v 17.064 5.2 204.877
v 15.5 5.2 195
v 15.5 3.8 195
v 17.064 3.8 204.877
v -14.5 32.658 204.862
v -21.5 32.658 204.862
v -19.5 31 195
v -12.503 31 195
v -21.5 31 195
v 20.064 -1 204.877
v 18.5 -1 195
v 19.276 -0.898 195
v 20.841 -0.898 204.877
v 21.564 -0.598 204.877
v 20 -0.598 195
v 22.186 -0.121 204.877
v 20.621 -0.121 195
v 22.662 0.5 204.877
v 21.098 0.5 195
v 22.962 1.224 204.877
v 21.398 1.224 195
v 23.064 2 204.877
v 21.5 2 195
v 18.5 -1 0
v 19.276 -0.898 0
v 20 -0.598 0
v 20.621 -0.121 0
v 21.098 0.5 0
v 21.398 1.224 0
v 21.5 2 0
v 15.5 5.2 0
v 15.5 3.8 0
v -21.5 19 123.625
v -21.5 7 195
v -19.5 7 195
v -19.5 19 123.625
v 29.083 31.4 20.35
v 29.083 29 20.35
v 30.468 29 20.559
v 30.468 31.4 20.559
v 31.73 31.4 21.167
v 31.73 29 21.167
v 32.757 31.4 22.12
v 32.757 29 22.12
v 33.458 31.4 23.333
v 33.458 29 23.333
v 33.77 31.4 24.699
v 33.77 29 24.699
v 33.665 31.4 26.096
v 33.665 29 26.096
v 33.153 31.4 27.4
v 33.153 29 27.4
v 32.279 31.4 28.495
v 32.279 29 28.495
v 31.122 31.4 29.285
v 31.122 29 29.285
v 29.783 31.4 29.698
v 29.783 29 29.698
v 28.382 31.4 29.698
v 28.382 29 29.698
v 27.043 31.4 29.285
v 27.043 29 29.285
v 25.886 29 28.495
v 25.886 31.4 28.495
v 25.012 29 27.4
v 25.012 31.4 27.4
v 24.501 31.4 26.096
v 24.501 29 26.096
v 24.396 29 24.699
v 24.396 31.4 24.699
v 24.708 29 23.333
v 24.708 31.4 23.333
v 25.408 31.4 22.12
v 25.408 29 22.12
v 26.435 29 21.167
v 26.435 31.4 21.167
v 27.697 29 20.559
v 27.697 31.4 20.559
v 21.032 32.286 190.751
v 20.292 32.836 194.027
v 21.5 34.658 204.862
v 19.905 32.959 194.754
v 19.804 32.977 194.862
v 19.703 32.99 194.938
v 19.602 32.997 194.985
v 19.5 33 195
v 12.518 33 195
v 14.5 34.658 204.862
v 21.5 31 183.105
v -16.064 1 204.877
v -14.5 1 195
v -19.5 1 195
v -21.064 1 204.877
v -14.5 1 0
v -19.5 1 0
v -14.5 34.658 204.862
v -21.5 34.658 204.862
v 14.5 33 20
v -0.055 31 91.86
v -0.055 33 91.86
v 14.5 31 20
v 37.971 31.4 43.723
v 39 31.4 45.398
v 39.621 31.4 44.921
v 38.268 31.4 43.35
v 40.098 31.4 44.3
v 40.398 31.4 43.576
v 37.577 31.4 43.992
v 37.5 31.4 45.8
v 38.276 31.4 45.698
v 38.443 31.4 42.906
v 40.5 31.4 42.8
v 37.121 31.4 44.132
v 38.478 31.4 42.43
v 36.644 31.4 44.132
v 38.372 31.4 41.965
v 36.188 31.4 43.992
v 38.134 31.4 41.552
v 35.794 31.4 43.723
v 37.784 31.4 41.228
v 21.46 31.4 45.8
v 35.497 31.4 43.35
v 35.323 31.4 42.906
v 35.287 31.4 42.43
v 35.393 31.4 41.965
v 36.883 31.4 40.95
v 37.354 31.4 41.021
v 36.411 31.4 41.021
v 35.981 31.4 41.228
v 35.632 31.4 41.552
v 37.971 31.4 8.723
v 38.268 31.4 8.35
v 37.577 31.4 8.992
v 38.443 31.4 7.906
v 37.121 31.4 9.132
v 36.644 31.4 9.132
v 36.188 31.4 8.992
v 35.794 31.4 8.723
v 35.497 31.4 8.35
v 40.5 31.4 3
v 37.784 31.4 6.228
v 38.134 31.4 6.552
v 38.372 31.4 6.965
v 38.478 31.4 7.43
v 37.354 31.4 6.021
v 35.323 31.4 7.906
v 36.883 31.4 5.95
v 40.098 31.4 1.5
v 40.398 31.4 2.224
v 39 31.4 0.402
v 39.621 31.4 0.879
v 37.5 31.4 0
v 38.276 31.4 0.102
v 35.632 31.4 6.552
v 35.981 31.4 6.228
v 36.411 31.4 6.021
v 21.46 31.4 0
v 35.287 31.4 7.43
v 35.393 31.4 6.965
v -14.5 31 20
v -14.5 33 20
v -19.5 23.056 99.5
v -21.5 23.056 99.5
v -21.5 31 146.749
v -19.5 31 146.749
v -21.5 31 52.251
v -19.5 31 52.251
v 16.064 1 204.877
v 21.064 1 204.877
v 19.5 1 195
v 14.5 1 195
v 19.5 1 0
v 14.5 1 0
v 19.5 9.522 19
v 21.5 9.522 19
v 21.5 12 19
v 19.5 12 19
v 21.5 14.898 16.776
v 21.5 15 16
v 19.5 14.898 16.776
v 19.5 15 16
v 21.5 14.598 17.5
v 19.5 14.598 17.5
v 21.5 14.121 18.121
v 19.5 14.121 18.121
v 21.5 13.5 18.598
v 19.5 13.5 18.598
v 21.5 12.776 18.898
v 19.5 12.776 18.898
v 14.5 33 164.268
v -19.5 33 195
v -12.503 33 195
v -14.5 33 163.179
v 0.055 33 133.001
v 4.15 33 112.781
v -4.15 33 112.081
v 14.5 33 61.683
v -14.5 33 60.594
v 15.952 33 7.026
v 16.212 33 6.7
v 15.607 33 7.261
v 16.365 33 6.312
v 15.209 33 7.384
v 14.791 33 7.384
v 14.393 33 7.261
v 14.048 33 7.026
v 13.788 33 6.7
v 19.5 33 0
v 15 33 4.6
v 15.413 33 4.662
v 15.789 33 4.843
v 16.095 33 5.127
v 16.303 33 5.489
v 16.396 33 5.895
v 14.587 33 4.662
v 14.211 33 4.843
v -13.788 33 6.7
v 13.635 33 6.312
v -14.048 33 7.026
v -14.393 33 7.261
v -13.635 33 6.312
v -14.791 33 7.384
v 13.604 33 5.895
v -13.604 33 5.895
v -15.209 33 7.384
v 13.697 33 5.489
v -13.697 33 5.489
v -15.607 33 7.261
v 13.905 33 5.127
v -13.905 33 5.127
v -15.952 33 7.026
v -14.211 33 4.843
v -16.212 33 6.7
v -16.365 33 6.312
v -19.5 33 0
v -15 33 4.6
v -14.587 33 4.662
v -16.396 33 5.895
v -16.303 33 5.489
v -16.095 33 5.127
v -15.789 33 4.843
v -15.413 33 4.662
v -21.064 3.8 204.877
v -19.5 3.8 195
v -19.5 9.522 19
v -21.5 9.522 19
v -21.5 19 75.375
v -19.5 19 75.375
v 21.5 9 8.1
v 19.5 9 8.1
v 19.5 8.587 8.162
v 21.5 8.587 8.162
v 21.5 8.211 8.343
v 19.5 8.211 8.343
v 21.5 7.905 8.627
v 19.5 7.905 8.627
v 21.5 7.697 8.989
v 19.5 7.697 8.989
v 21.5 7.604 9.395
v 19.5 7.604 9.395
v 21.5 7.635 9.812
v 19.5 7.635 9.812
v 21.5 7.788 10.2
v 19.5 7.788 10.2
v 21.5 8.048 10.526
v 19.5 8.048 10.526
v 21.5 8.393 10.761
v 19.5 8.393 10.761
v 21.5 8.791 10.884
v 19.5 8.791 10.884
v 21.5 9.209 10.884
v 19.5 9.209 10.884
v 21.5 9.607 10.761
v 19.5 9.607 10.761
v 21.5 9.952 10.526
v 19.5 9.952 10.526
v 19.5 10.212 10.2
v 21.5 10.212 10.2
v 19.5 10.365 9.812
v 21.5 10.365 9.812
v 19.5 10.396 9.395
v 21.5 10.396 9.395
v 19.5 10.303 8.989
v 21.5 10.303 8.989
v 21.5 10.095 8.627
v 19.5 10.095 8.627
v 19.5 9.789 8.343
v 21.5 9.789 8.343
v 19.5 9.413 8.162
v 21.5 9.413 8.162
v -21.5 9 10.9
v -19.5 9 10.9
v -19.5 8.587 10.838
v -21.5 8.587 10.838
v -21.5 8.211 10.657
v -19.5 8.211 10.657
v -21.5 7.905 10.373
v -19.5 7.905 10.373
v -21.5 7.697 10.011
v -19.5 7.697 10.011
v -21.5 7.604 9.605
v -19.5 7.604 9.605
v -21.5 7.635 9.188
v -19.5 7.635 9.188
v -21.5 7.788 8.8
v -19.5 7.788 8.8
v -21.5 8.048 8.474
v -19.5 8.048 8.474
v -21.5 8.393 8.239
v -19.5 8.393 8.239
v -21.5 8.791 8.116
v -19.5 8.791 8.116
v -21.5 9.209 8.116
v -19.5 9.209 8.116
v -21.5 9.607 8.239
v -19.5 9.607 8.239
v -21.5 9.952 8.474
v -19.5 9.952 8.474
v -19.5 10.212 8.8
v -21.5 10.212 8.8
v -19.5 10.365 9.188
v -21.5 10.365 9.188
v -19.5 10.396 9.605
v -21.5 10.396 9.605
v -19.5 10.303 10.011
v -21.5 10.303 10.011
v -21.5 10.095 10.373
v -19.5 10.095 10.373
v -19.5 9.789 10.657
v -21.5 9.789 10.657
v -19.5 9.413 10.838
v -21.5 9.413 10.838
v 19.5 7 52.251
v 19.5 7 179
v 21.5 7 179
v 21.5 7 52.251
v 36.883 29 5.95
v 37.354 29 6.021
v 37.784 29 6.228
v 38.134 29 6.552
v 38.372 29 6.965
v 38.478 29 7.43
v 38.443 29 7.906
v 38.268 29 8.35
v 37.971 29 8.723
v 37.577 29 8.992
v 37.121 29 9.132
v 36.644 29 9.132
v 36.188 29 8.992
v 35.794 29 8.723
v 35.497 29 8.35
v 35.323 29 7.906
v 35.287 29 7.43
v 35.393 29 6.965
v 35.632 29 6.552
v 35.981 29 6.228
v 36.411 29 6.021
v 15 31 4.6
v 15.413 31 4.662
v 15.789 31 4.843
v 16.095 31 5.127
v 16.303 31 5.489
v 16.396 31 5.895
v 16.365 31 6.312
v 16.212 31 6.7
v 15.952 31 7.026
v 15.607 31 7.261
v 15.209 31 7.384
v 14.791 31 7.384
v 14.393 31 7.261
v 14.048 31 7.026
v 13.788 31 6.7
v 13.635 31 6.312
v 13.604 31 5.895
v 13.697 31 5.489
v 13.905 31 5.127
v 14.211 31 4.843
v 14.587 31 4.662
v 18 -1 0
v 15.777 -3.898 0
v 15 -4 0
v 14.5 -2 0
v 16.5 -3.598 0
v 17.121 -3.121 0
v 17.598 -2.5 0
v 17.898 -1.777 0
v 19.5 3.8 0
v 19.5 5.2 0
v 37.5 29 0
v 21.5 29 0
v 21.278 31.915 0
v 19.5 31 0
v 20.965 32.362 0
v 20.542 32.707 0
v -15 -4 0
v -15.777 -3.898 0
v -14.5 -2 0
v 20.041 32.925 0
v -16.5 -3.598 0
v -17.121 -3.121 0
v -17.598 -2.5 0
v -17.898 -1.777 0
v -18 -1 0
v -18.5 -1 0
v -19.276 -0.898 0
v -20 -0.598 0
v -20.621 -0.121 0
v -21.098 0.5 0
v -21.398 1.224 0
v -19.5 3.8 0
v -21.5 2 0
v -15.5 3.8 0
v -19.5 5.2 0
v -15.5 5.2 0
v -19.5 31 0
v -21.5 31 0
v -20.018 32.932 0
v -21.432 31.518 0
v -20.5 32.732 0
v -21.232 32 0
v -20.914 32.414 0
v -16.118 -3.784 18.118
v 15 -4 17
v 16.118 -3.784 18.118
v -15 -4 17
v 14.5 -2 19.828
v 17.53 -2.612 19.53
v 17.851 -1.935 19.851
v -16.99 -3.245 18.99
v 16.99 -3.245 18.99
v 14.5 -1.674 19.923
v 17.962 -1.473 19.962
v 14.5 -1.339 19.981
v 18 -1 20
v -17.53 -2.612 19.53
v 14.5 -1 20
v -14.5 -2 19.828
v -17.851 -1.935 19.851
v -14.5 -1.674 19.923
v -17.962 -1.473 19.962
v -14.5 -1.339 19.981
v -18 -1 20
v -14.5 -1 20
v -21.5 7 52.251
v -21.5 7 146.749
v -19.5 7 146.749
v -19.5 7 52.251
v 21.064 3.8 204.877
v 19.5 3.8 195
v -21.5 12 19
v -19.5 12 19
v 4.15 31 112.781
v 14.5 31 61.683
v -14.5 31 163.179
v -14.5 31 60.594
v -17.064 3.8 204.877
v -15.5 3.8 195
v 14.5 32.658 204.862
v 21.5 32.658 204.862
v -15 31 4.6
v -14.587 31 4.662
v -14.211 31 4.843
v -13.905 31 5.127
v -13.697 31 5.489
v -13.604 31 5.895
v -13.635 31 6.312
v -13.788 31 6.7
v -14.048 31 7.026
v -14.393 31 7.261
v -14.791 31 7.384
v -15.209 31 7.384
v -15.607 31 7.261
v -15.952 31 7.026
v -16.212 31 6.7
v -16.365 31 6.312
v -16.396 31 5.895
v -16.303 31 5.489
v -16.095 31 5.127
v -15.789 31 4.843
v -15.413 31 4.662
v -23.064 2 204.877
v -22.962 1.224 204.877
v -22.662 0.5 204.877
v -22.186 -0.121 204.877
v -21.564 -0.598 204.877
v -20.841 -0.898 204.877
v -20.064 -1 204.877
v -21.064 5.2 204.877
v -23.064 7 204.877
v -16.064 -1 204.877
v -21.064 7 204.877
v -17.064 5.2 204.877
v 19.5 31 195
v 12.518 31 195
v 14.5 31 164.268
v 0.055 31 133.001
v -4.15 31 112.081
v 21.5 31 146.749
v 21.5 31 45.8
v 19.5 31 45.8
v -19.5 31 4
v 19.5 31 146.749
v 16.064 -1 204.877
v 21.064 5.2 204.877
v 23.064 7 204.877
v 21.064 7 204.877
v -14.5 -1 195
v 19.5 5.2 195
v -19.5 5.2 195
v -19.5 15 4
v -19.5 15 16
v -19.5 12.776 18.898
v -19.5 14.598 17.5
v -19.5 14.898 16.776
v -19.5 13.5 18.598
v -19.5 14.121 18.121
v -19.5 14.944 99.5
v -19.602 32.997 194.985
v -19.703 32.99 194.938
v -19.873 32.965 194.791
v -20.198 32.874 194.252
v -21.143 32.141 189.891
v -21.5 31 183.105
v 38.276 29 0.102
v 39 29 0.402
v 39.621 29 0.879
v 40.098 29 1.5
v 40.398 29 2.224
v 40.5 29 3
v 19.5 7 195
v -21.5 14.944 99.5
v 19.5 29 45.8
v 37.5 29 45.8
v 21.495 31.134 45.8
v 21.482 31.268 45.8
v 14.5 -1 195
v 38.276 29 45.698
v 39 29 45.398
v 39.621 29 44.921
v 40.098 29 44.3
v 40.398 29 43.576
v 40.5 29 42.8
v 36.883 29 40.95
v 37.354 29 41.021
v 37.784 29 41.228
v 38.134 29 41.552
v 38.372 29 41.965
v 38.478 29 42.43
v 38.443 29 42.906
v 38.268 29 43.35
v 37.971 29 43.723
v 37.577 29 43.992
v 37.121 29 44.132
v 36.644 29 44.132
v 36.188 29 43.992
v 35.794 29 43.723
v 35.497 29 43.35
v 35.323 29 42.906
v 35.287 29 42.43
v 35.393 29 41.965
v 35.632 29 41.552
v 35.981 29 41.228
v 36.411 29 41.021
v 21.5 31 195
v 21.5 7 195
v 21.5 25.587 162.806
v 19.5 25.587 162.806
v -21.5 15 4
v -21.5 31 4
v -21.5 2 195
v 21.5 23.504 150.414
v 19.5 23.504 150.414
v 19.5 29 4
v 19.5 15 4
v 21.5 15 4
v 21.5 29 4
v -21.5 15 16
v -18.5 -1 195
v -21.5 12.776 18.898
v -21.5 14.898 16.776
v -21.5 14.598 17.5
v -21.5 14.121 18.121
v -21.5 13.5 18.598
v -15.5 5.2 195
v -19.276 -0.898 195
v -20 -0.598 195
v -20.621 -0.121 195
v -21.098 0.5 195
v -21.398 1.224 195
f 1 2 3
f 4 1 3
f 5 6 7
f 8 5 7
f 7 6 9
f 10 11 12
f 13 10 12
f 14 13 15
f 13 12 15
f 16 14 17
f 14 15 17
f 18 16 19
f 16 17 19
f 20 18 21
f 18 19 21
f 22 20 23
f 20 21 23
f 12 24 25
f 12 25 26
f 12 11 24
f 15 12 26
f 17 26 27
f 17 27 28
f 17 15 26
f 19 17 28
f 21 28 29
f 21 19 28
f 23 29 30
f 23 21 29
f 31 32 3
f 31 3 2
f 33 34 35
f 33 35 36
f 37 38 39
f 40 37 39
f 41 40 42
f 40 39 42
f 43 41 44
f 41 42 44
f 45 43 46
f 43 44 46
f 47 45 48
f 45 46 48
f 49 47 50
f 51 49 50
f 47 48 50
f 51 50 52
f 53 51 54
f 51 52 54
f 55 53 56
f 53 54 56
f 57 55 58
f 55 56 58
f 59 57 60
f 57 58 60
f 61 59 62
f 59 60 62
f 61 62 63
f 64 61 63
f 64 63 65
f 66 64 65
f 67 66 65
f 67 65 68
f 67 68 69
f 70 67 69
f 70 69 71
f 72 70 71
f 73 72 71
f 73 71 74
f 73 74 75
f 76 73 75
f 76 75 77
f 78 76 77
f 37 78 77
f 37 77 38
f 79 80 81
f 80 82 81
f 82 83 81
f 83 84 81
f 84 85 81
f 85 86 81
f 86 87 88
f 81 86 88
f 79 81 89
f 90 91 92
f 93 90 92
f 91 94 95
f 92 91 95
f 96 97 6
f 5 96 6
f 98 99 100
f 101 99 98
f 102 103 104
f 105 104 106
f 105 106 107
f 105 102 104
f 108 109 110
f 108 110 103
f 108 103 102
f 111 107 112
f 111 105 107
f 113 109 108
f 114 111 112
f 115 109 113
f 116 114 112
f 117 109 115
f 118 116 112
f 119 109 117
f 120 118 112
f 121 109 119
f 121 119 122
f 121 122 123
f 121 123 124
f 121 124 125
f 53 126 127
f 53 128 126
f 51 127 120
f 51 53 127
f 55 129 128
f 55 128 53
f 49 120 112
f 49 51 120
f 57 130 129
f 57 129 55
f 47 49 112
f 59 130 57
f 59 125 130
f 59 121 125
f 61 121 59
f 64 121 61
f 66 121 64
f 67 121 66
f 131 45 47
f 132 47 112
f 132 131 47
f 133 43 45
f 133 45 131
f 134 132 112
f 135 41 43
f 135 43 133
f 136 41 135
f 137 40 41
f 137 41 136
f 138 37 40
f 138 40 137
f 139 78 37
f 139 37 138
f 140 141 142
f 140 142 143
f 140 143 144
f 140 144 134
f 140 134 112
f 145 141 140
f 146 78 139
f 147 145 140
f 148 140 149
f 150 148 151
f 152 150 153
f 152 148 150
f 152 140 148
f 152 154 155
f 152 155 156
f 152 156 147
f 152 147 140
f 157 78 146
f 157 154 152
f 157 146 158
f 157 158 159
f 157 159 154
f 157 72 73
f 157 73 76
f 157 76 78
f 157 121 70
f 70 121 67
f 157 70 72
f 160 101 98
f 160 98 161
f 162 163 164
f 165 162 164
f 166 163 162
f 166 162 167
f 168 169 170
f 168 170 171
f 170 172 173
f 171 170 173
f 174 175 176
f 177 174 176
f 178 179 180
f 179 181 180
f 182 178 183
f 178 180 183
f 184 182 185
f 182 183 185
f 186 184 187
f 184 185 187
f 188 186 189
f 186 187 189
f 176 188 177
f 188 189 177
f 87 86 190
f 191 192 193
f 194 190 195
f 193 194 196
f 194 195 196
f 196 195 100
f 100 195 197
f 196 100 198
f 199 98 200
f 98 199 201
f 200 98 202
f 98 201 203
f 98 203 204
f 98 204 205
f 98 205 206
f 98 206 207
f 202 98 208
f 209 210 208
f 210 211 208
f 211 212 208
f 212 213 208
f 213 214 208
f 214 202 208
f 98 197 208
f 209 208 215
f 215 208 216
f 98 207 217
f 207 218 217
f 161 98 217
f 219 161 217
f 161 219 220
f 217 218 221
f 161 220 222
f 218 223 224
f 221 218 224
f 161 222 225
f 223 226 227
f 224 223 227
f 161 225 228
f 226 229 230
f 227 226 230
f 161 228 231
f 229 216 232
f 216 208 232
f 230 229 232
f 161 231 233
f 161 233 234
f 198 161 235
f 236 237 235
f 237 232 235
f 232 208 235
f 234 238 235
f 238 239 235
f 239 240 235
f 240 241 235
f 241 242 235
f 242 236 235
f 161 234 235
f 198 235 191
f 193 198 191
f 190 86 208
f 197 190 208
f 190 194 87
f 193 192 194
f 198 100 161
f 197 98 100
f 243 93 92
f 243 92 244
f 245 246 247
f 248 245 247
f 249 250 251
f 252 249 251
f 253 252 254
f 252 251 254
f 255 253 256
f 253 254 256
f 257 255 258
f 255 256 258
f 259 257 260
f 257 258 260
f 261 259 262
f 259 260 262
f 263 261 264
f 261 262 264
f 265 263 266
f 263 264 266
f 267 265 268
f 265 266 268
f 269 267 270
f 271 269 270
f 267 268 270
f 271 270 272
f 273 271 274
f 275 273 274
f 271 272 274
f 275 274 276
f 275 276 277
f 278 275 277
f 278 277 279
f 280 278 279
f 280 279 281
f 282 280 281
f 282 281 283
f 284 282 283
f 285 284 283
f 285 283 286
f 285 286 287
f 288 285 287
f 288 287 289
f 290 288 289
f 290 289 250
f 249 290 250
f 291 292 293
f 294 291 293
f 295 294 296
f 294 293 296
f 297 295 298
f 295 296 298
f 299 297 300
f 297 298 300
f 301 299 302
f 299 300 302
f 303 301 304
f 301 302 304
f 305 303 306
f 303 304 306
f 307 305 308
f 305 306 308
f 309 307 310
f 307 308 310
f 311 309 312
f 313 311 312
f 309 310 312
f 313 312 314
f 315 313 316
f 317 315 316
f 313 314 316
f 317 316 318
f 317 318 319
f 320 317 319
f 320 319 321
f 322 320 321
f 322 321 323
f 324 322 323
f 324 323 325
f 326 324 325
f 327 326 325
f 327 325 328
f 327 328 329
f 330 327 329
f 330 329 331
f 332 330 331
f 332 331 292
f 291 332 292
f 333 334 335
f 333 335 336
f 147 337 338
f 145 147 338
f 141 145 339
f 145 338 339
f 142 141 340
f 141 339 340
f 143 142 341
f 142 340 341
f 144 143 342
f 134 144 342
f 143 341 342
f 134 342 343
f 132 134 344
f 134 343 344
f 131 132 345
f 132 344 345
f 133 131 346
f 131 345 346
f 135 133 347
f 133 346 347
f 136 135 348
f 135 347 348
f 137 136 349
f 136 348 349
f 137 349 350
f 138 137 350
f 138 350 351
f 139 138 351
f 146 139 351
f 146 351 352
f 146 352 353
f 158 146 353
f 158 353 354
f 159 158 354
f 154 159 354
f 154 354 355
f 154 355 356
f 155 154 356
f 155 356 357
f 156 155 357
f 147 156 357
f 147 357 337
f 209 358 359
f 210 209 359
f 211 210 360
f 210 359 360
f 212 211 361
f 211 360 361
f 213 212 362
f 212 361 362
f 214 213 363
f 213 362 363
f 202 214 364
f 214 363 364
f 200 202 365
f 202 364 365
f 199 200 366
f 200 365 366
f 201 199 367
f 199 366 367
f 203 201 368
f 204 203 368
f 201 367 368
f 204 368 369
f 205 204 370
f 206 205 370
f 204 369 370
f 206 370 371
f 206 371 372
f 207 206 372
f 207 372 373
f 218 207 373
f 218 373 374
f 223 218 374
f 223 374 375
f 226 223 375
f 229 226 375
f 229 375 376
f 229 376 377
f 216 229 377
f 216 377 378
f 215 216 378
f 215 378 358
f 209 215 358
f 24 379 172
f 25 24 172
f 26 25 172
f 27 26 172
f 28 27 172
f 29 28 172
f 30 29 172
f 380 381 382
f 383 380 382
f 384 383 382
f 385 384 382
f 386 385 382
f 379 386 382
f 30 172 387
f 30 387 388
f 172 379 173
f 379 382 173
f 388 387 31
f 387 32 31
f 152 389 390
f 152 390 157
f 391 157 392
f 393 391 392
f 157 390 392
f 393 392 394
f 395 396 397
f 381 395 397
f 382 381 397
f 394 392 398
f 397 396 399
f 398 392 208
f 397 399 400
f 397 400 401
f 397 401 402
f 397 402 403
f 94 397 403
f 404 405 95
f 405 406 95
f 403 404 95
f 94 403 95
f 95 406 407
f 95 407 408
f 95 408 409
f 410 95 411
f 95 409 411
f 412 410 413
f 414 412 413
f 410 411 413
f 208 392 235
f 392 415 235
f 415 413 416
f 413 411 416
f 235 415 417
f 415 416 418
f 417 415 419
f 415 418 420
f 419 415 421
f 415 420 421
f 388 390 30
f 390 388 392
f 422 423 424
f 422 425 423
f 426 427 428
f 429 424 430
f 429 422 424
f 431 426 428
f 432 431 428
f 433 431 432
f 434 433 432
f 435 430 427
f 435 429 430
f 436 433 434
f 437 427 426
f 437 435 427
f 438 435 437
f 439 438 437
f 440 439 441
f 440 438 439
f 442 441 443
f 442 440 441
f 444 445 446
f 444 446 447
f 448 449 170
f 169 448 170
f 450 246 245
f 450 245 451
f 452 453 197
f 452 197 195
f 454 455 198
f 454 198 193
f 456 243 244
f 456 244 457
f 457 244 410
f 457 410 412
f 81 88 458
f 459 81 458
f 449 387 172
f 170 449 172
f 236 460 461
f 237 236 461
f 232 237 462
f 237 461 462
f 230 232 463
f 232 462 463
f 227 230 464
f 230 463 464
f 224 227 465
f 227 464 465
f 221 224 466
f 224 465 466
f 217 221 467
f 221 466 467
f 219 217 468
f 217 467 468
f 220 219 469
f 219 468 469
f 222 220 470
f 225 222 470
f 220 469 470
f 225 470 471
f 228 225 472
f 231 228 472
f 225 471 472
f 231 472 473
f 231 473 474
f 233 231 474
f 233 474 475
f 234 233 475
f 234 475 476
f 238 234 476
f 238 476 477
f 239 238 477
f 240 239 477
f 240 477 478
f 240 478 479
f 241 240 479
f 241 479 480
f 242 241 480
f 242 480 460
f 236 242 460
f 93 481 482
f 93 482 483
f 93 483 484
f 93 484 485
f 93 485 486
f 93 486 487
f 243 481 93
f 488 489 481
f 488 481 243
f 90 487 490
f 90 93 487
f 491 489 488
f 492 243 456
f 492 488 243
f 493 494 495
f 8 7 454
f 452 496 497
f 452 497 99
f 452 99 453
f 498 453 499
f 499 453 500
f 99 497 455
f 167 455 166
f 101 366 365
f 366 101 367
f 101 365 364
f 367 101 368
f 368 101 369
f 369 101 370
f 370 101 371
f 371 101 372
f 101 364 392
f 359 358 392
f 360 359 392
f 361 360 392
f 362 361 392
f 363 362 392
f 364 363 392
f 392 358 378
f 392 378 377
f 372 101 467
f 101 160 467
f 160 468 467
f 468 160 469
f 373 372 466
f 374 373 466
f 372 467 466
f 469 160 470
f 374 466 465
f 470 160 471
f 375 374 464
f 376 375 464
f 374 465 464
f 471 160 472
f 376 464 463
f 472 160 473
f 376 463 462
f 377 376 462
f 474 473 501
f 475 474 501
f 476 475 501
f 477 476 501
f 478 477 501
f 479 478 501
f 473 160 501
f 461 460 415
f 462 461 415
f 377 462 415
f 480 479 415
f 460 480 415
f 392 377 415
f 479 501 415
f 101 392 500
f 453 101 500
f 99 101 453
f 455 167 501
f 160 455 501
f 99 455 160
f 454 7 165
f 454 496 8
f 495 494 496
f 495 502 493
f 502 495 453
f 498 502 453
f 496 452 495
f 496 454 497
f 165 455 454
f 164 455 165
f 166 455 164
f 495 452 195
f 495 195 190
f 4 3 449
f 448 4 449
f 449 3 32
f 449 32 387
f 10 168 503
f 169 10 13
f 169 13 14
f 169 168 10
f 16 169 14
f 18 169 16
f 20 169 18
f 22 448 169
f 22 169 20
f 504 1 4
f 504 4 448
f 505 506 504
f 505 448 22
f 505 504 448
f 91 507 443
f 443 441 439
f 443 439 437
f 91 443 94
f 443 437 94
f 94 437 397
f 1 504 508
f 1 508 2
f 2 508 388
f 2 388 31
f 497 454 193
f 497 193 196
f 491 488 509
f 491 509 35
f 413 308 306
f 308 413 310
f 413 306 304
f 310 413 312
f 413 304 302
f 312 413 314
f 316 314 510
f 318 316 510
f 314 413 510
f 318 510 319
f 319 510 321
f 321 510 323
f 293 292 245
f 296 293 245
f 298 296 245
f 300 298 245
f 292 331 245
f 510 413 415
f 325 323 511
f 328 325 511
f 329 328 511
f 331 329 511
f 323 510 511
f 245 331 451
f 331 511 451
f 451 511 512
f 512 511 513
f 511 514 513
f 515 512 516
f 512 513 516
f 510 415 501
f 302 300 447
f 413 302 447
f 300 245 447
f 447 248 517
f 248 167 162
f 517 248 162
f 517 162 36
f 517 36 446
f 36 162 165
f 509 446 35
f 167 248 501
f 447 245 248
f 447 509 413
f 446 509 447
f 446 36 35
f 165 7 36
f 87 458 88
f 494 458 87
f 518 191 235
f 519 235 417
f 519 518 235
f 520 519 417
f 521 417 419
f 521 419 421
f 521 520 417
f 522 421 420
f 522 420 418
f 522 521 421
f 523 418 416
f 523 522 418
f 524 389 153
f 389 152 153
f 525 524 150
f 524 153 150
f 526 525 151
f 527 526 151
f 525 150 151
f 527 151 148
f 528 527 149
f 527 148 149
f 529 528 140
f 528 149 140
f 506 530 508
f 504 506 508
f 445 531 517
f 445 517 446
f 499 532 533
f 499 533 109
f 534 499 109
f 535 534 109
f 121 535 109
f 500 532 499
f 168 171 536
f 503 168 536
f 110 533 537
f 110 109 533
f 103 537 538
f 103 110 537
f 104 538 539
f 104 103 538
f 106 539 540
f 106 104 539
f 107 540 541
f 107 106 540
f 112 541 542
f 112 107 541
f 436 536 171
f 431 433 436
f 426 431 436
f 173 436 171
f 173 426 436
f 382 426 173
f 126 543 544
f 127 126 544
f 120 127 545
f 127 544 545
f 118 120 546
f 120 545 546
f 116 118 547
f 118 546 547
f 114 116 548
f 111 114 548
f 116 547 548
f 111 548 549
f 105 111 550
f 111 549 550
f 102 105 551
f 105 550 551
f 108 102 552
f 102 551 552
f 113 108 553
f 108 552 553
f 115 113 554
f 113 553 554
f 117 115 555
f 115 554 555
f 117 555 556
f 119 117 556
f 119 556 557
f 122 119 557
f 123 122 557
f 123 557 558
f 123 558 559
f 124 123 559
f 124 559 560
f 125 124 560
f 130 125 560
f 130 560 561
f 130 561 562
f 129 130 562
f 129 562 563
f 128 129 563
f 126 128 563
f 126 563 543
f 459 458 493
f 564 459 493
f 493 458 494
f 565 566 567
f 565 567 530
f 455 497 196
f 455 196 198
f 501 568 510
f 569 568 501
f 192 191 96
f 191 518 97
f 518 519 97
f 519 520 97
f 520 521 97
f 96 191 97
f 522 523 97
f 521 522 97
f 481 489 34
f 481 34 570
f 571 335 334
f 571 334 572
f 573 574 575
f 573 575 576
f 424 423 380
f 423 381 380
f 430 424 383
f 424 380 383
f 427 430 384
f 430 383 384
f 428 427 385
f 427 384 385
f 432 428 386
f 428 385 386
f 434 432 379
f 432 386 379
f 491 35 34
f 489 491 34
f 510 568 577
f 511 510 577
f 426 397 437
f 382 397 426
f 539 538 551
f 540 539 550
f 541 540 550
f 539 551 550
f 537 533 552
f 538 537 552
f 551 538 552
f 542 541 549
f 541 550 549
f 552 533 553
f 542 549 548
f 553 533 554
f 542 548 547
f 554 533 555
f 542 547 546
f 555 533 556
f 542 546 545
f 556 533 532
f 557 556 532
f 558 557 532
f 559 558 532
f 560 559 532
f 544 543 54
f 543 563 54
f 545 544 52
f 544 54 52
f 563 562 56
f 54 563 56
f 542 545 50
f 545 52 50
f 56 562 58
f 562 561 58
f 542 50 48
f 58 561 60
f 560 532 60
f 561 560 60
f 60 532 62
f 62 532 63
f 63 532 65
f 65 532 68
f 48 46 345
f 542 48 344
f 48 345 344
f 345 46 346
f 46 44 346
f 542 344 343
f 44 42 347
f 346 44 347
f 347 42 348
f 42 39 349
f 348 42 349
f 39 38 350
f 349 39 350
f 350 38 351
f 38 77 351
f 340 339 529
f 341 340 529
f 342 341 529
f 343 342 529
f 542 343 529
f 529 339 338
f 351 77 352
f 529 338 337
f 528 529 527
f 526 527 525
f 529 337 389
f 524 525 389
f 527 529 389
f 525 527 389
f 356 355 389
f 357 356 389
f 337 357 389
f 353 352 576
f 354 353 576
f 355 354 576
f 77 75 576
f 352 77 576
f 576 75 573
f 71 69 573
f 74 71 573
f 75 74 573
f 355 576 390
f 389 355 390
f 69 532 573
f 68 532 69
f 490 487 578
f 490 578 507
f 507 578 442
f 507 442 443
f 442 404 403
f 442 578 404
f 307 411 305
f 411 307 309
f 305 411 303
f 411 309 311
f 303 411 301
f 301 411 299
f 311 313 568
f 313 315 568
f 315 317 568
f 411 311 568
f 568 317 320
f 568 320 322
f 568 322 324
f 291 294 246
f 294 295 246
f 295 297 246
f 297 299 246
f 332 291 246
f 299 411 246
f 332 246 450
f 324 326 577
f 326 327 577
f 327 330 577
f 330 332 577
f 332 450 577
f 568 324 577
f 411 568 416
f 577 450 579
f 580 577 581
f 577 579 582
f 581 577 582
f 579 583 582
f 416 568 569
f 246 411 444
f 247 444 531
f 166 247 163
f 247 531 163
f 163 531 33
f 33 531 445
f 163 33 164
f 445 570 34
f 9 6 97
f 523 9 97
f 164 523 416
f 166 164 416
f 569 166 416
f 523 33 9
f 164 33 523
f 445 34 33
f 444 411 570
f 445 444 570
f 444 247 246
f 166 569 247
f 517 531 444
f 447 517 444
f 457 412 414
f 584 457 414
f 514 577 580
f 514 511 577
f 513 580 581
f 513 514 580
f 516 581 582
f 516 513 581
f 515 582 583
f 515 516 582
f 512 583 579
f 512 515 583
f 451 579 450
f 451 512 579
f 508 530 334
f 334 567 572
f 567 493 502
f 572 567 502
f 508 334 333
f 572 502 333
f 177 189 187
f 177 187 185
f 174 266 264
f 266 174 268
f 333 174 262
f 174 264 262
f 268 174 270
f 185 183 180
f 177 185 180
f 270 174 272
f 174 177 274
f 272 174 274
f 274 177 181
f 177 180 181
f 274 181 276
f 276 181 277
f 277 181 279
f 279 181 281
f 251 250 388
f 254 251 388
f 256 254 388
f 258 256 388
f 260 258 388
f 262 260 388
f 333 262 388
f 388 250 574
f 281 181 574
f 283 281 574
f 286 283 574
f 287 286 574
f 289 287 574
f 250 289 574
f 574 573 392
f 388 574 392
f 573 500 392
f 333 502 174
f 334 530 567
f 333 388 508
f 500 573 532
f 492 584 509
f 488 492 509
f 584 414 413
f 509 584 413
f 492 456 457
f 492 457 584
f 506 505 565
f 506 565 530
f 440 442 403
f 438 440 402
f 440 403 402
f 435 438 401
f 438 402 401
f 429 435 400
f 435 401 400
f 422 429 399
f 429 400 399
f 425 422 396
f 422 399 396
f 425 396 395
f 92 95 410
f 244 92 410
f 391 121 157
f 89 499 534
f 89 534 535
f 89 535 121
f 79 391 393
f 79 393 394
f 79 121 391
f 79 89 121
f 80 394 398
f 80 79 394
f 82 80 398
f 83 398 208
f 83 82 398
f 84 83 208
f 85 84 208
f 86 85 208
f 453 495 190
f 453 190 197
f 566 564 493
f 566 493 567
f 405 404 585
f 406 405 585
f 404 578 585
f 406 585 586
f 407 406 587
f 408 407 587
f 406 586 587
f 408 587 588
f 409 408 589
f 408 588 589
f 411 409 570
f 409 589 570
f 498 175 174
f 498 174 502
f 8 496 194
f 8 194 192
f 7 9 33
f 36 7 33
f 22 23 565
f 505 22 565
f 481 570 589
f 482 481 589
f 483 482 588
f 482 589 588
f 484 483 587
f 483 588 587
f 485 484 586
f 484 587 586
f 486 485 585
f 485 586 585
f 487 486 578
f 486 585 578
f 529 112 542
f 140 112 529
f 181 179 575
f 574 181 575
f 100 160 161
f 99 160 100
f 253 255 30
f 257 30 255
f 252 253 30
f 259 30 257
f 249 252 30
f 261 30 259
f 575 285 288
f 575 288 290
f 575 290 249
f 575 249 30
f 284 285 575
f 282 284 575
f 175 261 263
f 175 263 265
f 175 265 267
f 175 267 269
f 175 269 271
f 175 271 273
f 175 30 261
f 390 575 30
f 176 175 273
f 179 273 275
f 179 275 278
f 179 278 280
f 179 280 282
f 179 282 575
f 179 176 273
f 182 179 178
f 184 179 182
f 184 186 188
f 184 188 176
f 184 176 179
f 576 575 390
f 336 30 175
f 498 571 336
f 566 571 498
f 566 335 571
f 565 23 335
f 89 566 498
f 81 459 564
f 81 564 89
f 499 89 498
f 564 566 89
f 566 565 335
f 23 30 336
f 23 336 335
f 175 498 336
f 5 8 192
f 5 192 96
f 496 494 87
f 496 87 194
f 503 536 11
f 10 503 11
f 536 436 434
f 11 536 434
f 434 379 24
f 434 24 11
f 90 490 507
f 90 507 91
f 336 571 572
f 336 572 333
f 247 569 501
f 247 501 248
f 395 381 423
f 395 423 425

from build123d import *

# Parameters (mm, degrees)
SKETCH1_W                                 = 4
SKETCH1_H                                 = 1.4
SKETCH1_W_2                               = 39
SKETCH1_H_2                               = 2
SKETCH1_W_3                               = 2
SKETCH1_H_3                               = 27.8
SKETCH1_W_4                               = 19.5
BOSS_EXTRUDE1_DEPTH                       = 195
CUT_EXTRUDE1_DEPTH                        = 203.393181703
CUT_EXTRUDE1_DEPTH_BACK                   = 203.393181703
SKETCH2_W                                 = 191
SKETCH2_H                                 = 24
SKETCH3_W                                 = 29
SKETCH3_H                                 = 223
CUT_EXTRUDE2_DEPTH                        = 2
SKETCH5_W                                 = 45.8
SKETCH5_H                                 = 4
BOSS_EXTRUDE2_DEPTH                       = 2
SKETCH8_W                                 = 15
SKETCH8_H                                 = 8
BOSS_EXTRUDE4_DEPTH                       = 2
SKETCH9_W                                 = 15
SKETCH9_H                                 = 8
BOSS_EXTRUDE5_DEPTH                       = 2
BOSS_EXTRUDE6_DEPTH                       = 2
SKETCH6_W                                 = 45.8
SKETCH6_H                                 = 2.4
BOSS_EXTRUDE9_DEPTH                       = 19
SKETCH14_R                                = 4.7
SKETCH14_R_2                              = 1.6
CUT_EXTRUDE3_DEPTH                        = 19
TAP_DRILL_FOR_M3X0_5_TAP1_D               = 2.8
TAP_DRILL_FOR_M3X0_5_TAP1_DEPTH           = 10
TAP_DRILL_FOR_M3X0_5_TAP1_TIP             = 0.841204867
TAP_DRILL_FOR_M3X0_5_TAP1_ON_FACE_2_D     = 2.8
TAP_DRILL_FOR_M3X0_5_TAP1_ON_FACE_2_DEPTH = 10
TAP_DRILL_FOR_M3X0_5_TAP1_ON_FACE_2_TIP   = 0.841204867
TAP_DRILL_FOR_M3X0_5_TAP2_D               = 2.8
TAP_DRILL_FOR_M3X0_5_TAP2_DEPTH           = 10
TAP_DRILL_FOR_M3X0_5_TAP2_TIP             = 0.841204867
BOSS_EXTRUDE10_DEPTH                      = 2
BOSS_EXTRUDE11_START                      = -21.5
BOSS_EXTRUDE11_DEPTH                      = 43
BOSS_EXTRUDE12_DEPTH                      = 3
BOSS_EXTRUDE12_DEPTH_BACK                 = 1
SKETCH23_W                                = 36
SKETCH23_H                                = 20
FILLET3_R                                 = 3
FILLET4_R                                 = 3
FILLET5_R                                 = 3
FILLET6_R                                 = 3
CHAMFER3_SIZE                             = 8
CHAMFER3_SIZE_2                           = 1.410615846
BOSS_EXTRUDE14_DEPTH                      = 10
BOSS_EXTRUDE15_DEPTH                      = 10
FILLET7_R                                 = 2
CUT_EXTRUDE6_DEPTH                        = 10
CUT_EXTRUDE6_DEPTH_BACK                   = 10
SKETCH28_W                                = 29
SKETCH28_H                                = 20
CUT_EXTRUDE7_DEPTH                        = 2


# Read off the part's stored shape, not the designer's step: Boss-Extrude11
# Some blends are built 0.0001 mm under size
with BuildPart() as part:
    # Sketch1 → Boss-Extrude1 (new body)
    with BuildSketch(Plane.XY):
        Polygon((19.5, 1), (19.5, -1), (21.5, -1), (21.5, 5.2), (19.5, 5.2), (19.5, 3.8), align=None)
        with Locations((17.5, 4.5)):
            Rectangle(SKETCH1_W, SKETCH1_H)
        Rectangle(SKETCH1_W_2, SKETCH1_H_2)
        Polygon((-21.5, -1), (-19.5, -1), (-19.5, 1), (-19.5, 3.8), (-19.5, 5.2), (-21.5, 5.2), align=None)
        with Locations((-17.5, 4.5)):
            Rectangle(SKETCH1_W, SKETCH1_H)
        with Locations((20.5, 19.1)):
            Rectangle(SKETCH1_W_3, SKETCH1_H_3)
        with Locations((9.75, 32)):
            Rectangle(SKETCH1_W_4, SKETCH1_H_2)
        with Locations((-9.75, 32)):
            Rectangle(SKETCH1_W_4, SKETCH1_H_2)
        Polygon((-21.5, 33), (-21.5, 5.2), (-19.5, 5.2), (-19.5, 31), (-19.5, 33), align=None)
    extrude(amount=BOSS_EXTRUDE1_DEPTH)

    # Sketch2 → Cut-Extrude1 (cut, two sides: drawn at the far end of the back side and taken through both)
    with BuildSketch(Plane(origin=(21.5, 0, 0), x_dir=(0, 0, -1), z_dir=(1, 0, 0)).offset(-CUT_EXTRUDE1_DEPTH_BACK)):
        with Locations((-99.5, 19)):
            Rectangle(SKETCH2_W, SKETCH2_H)
    extrude(amount=CUT_EXTRUDE1_DEPTH + CUT_EXTRUDE1_DEPTH_BACK, mode=Mode.SUBTRACT)

    # Sketch3 → Cut-Extrude2 (cut)
    with BuildSketch(Plane(origin=(0, -1, 0), x_dir=(-1, 0, 0), z_dir=(0, -1, 0))):
        with Locations((0, -103.5)):
            Rectangle(SKETCH3_W, SKETCH3_H)
    extrude(amount=-CUT_EXTRUDE2_DEPTH, mode=Mode.SUBTRACT)

    # Sketch5 → Boss-Extrude2 (add)
    with BuildSketch(Plane(origin=(21.5, 0, 0), x_dir=(0, 0, -1), z_dir=(1, 0, 0))):
        with Locations((-22.9, 31)):
            Rectangle(SKETCH5_W, SKETCH5_H)
    extrude(amount=-BOSS_EXTRUDE2_DEPTH)

    # Sketch8 → Boss-Extrude4 (add)
    with BuildSketch(Plane(origin=(21.5, 0, 0), x_dir=(0, 0, -1), z_dir=(1, 0, 0))):
        with Locations((-11.5, 11)):
            Rectangle(SKETCH8_W, SKETCH8_H)
    extrude(amount=-BOSS_EXTRUDE4_DEPTH)

    # Sketch9 → Boss-Extrude5 (add)
    with BuildSketch(Plane.ZY.offset(21.5)):
        with Locations((11.5, 11)):
            Rectangle(SKETCH9_W, SKETCH9_H)
    extrude(amount=-BOSS_EXTRUDE5_DEPTH)

    # Sketch10 → Boss-Extrude6 (add)
    with BuildSketch(Plane.ZY.offset(21.5)):
        Polygon((4, 31), (146.749133454, 7), (195, 7), (52.250866546, 31), align=None)
        Polygon((195, 31), (52.250866546, 7), (4, 7), (146.749133454, 31), align=None)
    extrude(amount=-BOSS_EXTRUDE6_DEPTH)

    # Sketch6 → Boss-Extrude9 (add)
    with BuildSketch(Plane(origin=(21.5, 0, 0), x_dir=(0, 0, -1), z_dir=(1, 0, 0))):
        with Locations((-22.9, 30.2)):
            Rectangle(SKETCH6_W, SKETCH6_H)
    extrude(amount=BOSS_EXTRUDE9_DEPTH)

    # Sketch14 → Cut-Extrude3 (cut)
    with BuildSketch(Plane(origin=(0, 29, 0), x_dir=(-1, 0, 0), z_dir=(0, -1, 0))):
        with Locations(Location((-29.082681436, -25.05, 0), (0, 0, 90))):
            Circle(SKETCH14_R)
        with Locations(Location((-36.882681436, -42.55, 0), (0, 0, 90))):
            Circle(SKETCH14_R_2)
        with Locations(Location((-36.882681436, -7.55, 0), (0, 0, 90))):
            Circle(SKETCH14_R_2)
    extrude(amount=-CUT_EXTRUDE3_DEPTH, mode=Mode.SUBTRACT)

    # Tap Drill for M3x0.5 Tap1
    with Locations(Plane(origin=(-21.5, 9, 9.5), x_dir=(0, 0, -1), z_dir=(-1, 0, 0))):
        with Locations((0, 0)):
            Hole(TAP_DRILL_FOR_M3X0_5_TAP1_D / 2, depth=TAP_DRILL_FOR_M3X0_5_TAP1_DEPTH)
            with Locations((0, 0, -(TAP_DRILL_FOR_M3X0_5_TAP1_DEPTH + TAP_DRILL_FOR_M3X0_5_TAP1_TIP / 2))):  # 118° drill point
                Cone(0, TAP_DRILL_FOR_M3X0_5_TAP1_D / 2, TAP_DRILL_FOR_M3X0_5_TAP1_TIP, mode=Mode.SUBTRACT)

    # Tap Drill for M3x0.5 Tap1 on face 2
    with Locations(Plane(origin=(21.5, 9, 9.5), x_dir=(0, 0, 1), z_dir=(1, 0, 0))):
        with Locations((0, 0)):
            Hole(TAP_DRILL_FOR_M3X0_5_TAP1_ON_FACE_2_D / 2, depth=TAP_DRILL_FOR_M3X0_5_TAP1_ON_FACE_2_DEPTH)
            with Locations((0, 0, -(TAP_DRILL_FOR_M3X0_5_TAP1_ON_FACE_2_DEPTH + TAP_DRILL_FOR_M3X0_5_TAP1_ON_FACE_2_TIP / 2))):  # 118° drill point
                Cone(0, TAP_DRILL_FOR_M3X0_5_TAP1_ON_FACE_2_D / 2, TAP_DRILL_FOR_M3X0_5_TAP1_ON_FACE_2_TIP, mode=Mode.SUBTRACT)

    # Tap Drill for M3x0.5 Tap2
    with Locations(Plane(origin=(15, 33, 6), x_dir=(0, 0, 1), z_dir=(0, 1, 0))):
        with Locations((0, 0), (0, -30)):
            Hole(TAP_DRILL_FOR_M3X0_5_TAP2_D / 2, depth=TAP_DRILL_FOR_M3X0_5_TAP2_DEPTH)
            with Locations((0, 0, -(TAP_DRILL_FOR_M3X0_5_TAP2_DEPTH + TAP_DRILL_FOR_M3X0_5_TAP2_TIP / 2))):  # 118° drill point
                Cone(0, TAP_DRILL_FOR_M3X0_5_TAP2_D / 2, TAP_DRILL_FOR_M3X0_5_TAP2_TIP, mode=Mode.SUBTRACT)

    # Sketch13 → Boss-Extrude10 (add)
    with BuildSketch(Plane(origin=(21.5, 0, 0), x_dir=(0, 0, -1), z_dir=(1, 0, 0))):
        Polygon((-150.414335828, 23.503940905), (-162.805864398, 25.587292856), (-195, 7), (-179, 7), align=None)
        Polygon((-146.749133454, 31), (-195, 31), (-162.805864398, 25.587292856), (-146.805864398, 25.587292856), (-150.414335828, 23.503940905), (-52.250866546, 7), (-19, 7), (-19, 9.521906727), align=None)
        Polygon((-146.805864398, 25.587292856), (-162.805864398, 25.587292856), (-150.414335828, 23.503940905), align=None)
    extrude(amount=-BOSS_EXTRUDE10_DEPTH)

    # Boss-Extrude11 outline → Boss-Extrude11 (add)
    with BuildSketch(Plane.YZ.offset(BOSS_EXTRUDE11_START)):
        Polygon((32.658001311, 204.861593768), (31, 195), (33, 195), (34.658001311, 204.861593768), align=None)
    extrude(amount=BOSS_EXTRUDE11_DEPTH)

    # Sketch23 → Boss-Extrude12 (add, two sides: drawn at the far end of the back side and taken through both)
    with BuildSketch(Plane(origin=(0, -1, 0), x_dir=(-1, 0, 0), z_dir=(0, -1, 0)).offset(-BOSS_EXTRUDE12_DEPTH_BACK)):
        with Locations((0, -10)):
            Rectangle(SKETCH23_W, SKETCH23_H)
    extrude(amount=BOSS_EXTRUDE12_DEPTH + BOSS_EXTRUDE12_DEPTH_BACK)

    # Fillet3
    fillet3_edges = [part.edges().sort_by_distance(p)[0] for p in [
        (18, -4, 10),
        (0, -4, 20),
        (-18, -4, 10),
    ]]
    fillet(fillet3_edges, radius=FILLET3_R - 0.0001)  # a hair under: the kernel refuses the full size

    # Fillet4
    fillet4_edges = [part.edges().sort_by_distance(p)[0] for p in [
        (21.5, -1, 97.5),
        (-21.5, -1, 97.5),
    ]]
    fillet(fillet4_edges, radius=FILLET4_R)

    # Fillet5
    fillet5_edges = [part.edges().sort_by_distance(p)[0] for p in [
        (20.5, 15, 19),
        (-20.5, 15, 19),
    ]]
    fillet(fillet5_edges, radius=FILLET5_R)

    # Fillet6
    fillet6_edges = [part.edges().sort_by_distance(p)[0] for p in [
        (40.5, 30.2, 45.8),
        (40.5, 30.2, 0),
    ]]
    fillet(fillet6_edges, radius=FILLET6_R)

    # Chamfer3
    # the kernel refuses this chamfer: 8, 1.410615846 mm, written as the material it takes off along each edge
    with BuildSketch(Plane(origin=(14.5, 0, 20), x_dir=(0, 0.0066825316561017496, -0.9999776716360547), z_dir=(-1, 0, 0))) as chamfer3_piece_1:
        Polygon((CHAMFER3_SIZE * 0.999977671636, CHAMFER3_SIZE * 0.0066825316561), (-CHAMFER3_SIZE_2 * 0.00668253165453, CHAMFER3_SIZE_2 * 0.999977671401), (0, 0), align=None)
    extrude(amount=29, mode=Mode.SUBTRACT)

    # Sketch24 → Boss-Extrude14 (add, along a direction that is not the sketch's normal)
    with BuildSketch(Plane.XY.offset(195)):
        with BuildLine():
            Line((-21.5, 7), (-21.5, 2))
            ThreePointArc((-21.5, 2), (-20.621320344, -0.121320344), (-18.5, -1))
            Line((-18.5, -1), (-14.5, -1))
            Line((-14.5, -1), (-14.5, 1))
            Line((-14.5, 1), (-19.5, 1))
            Line((-19.5, 1), (-19.5, 3.8))
            Line((-19.5, 3.8), (-15.5, 3.8))
            Line((-15.5, 3.8), (-15.5, 5.2))
            Line((-15.5, 5.2), (-19.5, 5.2))
            Line((-19.5, 5.2), (-19.5, 7))
            Line((-19.5, 7), (-21.5, 7))
        make_face()
    extrude(amount=BOSS_EXTRUDE14_DEPTH, dir=(-0.15643446504023106, 0, 0.9876883405951378))

    # Sketch26 → Boss-Extrude15 (add, along a direction that is not the sketch's normal)
    with BuildSketch(Plane.XY.offset(195)):
        with BuildLine():
            Line((14.5, -1), (18.5, -1))
            ThreePointArc((18.5, -1), (20.621320344, -0.121320344), (21.5, 2))
            Line((21.5, 2), (21.5, 7))
            Line((21.5, 7), (19.5, 7))
            Line((19.5, 7), (19.5, 5.2))
            Line((19.5, 5.2), (15.5, 5.2))
            Line((15.5, 5.2), (15.5, 3.8))
            Line((15.5, 3.8), (19.5, 3.8))
            Line((19.5, 3.8), (19.5, 1))
            Line((19.5, 1), (14.5, 1))
            Line((14.5, 1), (14.5, -1))
        make_face()
    extrude(amount=BOSS_EXTRUDE15_DEPTH, dir=(0.15643446504022418, 0, 0.9876883405951389))

    # Fillet7
    fillet7_edges = [part.edges().sort_by_distance(p)[0] for p in [
        (21.5, 33, 97.5),
        (-21.5, 33, 97.5),
    ]]
    fillet(fillet7_edges, radius=FILLET7_R - 0.0001)  # a hair under: the kernel refuses the full size

    # Sketch27 → Cut-Extrude6 (cut, two sides: drawn at the far end of the back side and taken through both)
    with BuildSketch(Plane(origin=(0, 33, 0), x_dir=(1, 0, 0), z_dir=(0, 1, 0)).offset(-CUT_EXTRUDE6_DEPTH_BACK)):
        Polygon((4.150405868, -112.780977824), (14.5, -164.267549777), (14.5, -61.683054851), align=None)
        Polygon((-14.5, -163.178538917), (-4.150405868, -112.080615944), (-14.5, -60.594043992), align=None)
        Polygon((-12.502590183, -195), (12.517667731, -195), (0.054934327, -133.001103045), align=None)
        Polygon((-8.142372311, -204.861593768), (14.5, -204.861593768), (12.517667731, -195), (-12.502590183, -195), (-14.5, -204.861593768), align=None)
        Polygon((-14.5, -20), (-0.054934327, -91.860490724), (14.5, -20), align=None)
    extrude(amount=CUT_EXTRUDE6_DEPTH + CUT_EXTRUDE6_DEPTH_BACK, mode=Mode.SUBTRACT)

    # Sketch28 → Cut-Extrude7 (cut)
    with BuildSketch(Plane(origin=(0, 0, 0), x_dir=(1, 0, 0), z_dir=(0, 1, 0))):
        with Locations((0, -10)):
            Rectangle(SKETCH28_W, SKETCH28_H)
    extrude(amount=-CUT_EXTRUDE7_DEPTH, mode=Mode.SUBTRACT)


solid = part.part
